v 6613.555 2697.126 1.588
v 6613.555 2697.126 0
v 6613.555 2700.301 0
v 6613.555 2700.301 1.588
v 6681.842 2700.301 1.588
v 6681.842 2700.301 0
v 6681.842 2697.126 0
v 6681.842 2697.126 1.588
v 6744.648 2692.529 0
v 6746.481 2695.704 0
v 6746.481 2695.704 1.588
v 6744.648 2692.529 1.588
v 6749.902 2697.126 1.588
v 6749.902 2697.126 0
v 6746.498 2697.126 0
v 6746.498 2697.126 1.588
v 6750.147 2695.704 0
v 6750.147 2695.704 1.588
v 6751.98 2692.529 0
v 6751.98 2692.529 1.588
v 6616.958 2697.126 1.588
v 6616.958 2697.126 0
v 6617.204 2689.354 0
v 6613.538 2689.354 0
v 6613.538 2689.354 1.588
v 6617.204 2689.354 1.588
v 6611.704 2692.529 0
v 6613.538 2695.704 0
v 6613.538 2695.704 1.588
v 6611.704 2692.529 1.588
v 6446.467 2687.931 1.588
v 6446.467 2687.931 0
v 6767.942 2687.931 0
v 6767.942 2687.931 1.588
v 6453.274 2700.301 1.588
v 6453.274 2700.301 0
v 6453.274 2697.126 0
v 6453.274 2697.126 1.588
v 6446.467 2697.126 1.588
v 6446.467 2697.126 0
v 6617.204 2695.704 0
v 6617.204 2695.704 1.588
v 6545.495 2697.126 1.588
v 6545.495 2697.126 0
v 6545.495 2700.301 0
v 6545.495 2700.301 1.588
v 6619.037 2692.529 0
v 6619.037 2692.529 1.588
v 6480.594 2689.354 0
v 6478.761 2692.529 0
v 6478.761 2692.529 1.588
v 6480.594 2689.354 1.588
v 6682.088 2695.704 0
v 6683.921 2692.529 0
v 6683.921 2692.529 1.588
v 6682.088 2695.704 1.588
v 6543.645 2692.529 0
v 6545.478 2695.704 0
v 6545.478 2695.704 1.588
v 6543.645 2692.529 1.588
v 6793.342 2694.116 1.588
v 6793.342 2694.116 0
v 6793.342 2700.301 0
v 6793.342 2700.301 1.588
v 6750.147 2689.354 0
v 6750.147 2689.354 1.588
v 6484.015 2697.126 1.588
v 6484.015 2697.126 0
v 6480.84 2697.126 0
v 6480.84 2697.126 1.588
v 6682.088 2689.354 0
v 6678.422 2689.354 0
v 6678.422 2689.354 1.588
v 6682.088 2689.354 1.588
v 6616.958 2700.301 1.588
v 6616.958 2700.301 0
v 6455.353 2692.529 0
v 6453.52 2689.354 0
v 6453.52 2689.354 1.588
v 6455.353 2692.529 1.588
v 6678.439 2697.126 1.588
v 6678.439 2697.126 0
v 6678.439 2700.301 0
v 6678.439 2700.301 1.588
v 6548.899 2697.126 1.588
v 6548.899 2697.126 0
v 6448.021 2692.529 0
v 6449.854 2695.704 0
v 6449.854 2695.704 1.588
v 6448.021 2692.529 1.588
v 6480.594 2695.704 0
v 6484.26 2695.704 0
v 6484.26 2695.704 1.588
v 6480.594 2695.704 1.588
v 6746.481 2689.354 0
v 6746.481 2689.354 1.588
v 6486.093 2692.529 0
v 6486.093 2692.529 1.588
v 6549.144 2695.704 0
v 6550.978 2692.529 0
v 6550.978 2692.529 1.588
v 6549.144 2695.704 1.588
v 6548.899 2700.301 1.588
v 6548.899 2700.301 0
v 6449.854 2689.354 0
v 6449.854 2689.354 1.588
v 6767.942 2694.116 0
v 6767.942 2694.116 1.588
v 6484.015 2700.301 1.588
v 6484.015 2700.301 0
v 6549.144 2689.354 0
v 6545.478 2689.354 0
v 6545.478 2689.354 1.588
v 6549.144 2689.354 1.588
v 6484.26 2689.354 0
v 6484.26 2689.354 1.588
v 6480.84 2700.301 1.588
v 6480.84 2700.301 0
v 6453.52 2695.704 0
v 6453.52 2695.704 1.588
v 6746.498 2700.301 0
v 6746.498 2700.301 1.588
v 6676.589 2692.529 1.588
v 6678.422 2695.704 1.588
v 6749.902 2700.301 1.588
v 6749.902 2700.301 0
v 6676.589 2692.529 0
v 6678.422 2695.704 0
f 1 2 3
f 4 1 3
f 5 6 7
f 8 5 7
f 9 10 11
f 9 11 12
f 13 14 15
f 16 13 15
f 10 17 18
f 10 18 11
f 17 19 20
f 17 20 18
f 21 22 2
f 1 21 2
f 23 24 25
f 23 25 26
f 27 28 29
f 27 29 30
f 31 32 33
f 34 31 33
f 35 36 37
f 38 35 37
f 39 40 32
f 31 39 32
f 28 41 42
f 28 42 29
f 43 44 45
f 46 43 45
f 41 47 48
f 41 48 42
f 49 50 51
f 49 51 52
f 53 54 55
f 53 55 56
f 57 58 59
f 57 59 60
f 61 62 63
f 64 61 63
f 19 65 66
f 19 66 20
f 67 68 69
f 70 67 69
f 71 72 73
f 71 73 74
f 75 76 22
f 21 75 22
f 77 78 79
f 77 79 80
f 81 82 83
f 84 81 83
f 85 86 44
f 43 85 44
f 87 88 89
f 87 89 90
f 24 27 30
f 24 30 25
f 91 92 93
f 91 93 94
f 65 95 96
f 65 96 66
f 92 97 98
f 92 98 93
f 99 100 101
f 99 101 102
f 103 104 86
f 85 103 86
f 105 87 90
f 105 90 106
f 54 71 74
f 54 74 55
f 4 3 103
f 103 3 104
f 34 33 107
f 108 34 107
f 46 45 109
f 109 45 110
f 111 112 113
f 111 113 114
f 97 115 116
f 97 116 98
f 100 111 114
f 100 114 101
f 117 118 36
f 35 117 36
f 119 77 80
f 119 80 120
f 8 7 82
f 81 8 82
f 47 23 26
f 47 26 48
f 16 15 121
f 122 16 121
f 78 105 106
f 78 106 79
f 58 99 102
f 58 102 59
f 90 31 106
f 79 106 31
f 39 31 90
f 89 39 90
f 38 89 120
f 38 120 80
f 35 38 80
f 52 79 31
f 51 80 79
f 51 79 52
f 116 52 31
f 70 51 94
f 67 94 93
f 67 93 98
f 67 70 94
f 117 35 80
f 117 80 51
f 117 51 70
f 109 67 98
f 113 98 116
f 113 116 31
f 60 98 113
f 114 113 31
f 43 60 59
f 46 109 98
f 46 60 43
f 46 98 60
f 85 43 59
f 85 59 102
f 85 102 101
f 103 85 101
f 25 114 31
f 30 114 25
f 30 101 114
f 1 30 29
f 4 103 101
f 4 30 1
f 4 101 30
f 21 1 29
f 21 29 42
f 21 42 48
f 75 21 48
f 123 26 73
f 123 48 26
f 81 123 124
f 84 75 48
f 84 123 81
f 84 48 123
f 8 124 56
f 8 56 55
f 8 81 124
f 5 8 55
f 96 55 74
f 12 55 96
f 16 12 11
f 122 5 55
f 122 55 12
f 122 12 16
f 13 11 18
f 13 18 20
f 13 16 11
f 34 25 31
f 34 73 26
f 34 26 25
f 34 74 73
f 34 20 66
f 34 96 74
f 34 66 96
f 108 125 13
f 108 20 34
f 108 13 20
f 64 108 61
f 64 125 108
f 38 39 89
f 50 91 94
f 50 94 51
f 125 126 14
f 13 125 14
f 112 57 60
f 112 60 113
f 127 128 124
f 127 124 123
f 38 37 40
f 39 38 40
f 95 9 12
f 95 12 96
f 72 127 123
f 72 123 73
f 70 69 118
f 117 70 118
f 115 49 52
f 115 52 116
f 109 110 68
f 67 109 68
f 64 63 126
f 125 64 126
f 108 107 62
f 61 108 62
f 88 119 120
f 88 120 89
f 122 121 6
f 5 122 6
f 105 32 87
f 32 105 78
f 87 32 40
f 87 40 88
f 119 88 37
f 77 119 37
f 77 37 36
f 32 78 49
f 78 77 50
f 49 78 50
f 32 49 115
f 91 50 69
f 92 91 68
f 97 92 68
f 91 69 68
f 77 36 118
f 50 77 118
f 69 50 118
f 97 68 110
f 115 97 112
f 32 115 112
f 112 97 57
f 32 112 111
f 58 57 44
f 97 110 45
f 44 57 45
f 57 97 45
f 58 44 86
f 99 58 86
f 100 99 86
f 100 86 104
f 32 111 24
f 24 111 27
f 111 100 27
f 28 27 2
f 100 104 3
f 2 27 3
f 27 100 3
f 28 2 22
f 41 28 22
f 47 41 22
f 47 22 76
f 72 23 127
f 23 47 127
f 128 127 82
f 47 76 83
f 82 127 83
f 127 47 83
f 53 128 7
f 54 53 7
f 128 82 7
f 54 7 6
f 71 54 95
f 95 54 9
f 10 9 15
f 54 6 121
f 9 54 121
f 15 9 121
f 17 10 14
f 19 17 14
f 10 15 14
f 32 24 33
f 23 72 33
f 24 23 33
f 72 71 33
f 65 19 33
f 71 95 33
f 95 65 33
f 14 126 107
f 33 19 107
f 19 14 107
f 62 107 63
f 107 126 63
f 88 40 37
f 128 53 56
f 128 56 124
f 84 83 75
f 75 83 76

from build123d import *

# Parameters (mm, degrees)
BOSS_EXTRUDE1_DEPTH = 1.5875


with BuildPart() as part:
    # Sketch1 → Boss-Extrude1 (new body)
    with BuildSketch(Plane.XY):
        Polygon((6453.274222112, 2700.300995821), (6453.274222112, 2697.125995821), (6446.467022112, 2697.125995821), (6446.467022112, 2687.931195821), (6767.942122112, 2687.931195821), (6767.942122112, 2694.116095821), (6793.342122112, 2694.116095821), (6793.342122112, 2700.300995821), (6749.901772112, 2700.300995821), (6749.901772112, 2697.125995821), (6746.498172112, 2697.125995821), (6746.498172112, 2700.300995821), (6681.842472112, 2700.300995821), (6681.842472112, 2697.125995821), (6678.438872112, 2697.125995821), (6678.438872112, 2700.300995821), (6616.958172112, 2700.300995821), (6616.958172112, 2697.125995821), (6613.554572112, 2697.125995821), (6613.554572112, 2700.300995821), (6548.898872112, 2700.300995821), (6548.898872112, 2697.125995821), (6545.495272112, 2697.125995821), (6545.495272112, 2700.300995821), (6484.014572112, 2700.300995821), (6484.014572112, 2697.125995821), (6480.839572112, 2697.125995821), (6480.839572112, 2700.300995821), align=None)
        Polygon((6484.260159217, 2689.353595821), (6486.093246321, 2692.528595821), (6484.260159217, 2695.703595821), (6480.593985007, 2695.703595821), (6478.760897903, 2692.528595821), (6480.593985007, 2689.353595821), align=None, mode=Mode.SUBTRACT)
        Polygon((6549.144459217, 2689.353595821), (6550.977546321, 2692.528595821), (6549.144459217, 2695.703595821), (6545.478285007, 2695.703595821), (6543.645197903, 2692.528595821), (6545.478285007, 2689.353595821), align=None, mode=Mode.SUBTRACT)
        Polygon((6617.203759217, 2689.353595821), (6619.036846321, 2692.528595821), (6617.203759217, 2695.703595821), (6613.537585007, 2695.703595821), (6611.704497903, 2692.528595821), (6613.537585007, 2689.353595821), align=None, mode=Mode.SUBTRACT)
        Polygon((6682.088059217, 2689.353595821), (6683.921146321, 2692.528595821), (6682.088059217, 2695.703595821), (6678.421885007, 2695.703595821), (6676.588797903, 2692.528595821), (6678.421885007, 2689.353595821), align=None, mode=Mode.SUBTRACT)
        Polygon((6750.147359217, 2689.353595821), (6751.980446321, 2692.528595821), (6750.147359217, 2695.703595821), (6746.481185007, 2695.703595821), (6744.648097903, 2692.528595821), (6746.481185007, 2689.353595821), align=None, mode=Mode.SUBTRACT)
        Polygon((6453.519809217, 2689.353595821), (6455.352896321, 2692.528595821), (6453.519809217, 2695.703595821), (6449.853635007, 2695.703595821), (6448.020547903, 2692.528595821), (6449.853635007, 2689.353595821), align=None, mode=Mode.SUBTRACT)
    extrude(amount=BOSS_EXTRUDE1_DEPTH)


solid = part.part
